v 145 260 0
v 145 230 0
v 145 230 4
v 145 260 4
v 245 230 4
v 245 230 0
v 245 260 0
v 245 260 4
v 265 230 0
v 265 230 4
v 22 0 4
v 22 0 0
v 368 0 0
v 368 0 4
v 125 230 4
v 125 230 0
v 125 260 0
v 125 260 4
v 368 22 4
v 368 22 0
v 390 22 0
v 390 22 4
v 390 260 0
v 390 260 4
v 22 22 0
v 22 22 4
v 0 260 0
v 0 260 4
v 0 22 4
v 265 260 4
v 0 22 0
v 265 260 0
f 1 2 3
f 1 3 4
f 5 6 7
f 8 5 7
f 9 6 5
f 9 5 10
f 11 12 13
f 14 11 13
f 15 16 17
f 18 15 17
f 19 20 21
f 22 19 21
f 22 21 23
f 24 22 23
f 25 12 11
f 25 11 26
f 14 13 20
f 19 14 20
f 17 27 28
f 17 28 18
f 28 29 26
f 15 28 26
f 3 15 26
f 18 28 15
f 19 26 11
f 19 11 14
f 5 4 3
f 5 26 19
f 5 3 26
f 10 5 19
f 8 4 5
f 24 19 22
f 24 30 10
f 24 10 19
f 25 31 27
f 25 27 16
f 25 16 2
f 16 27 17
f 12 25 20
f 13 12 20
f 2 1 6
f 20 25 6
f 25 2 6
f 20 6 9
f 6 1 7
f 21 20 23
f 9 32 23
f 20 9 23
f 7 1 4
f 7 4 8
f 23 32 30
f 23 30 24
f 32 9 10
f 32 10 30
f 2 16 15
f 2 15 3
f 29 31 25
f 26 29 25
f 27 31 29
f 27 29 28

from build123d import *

# Parameters (mm, degrees)
BOX004_W     = 20
BOX004_H     = 30
BOX004_DEPTH = 10
BOX003_W     = 20
BOX003_H     = 30
BOX003_DEPTH = 10
BOX002_W     = 22
BOX002_H     = 22
BOX002_DEPTH = 10
BOX001_W     = 22
BOX001_H     = 22
BOX001_DEPTH = 10
BOX_W        = 390
BOX_H        = 260
BOX_DEPTH    = 4


with BuildPart() as corte_rail_der:
    # Box004 → Box004 (new body)
    with BuildSketch(Plane(origin=(245, 230, -3), x_dir=(1, 0, 0), z_dir=(0, 0, 1))):
        with Locations((10, 15)):
            Rectangle(BOX004_W, BOX004_H)
    extrude(amount=BOX004_DEPTH)


with BuildPart() as corte_rail_izq:
    # Box003 → Box003 (new body)
    with BuildSketch(Plane(origin=(125, 230, -3), x_dir=(1, 0, 0), z_dir=(0, 0, 1))):
        with Locations((10, 15)):
            Rectangle(BOX003_W, BOX003_H)
    extrude(amount=BOX003_DEPTH)


with BuildPart() as corte_der:
    # Box002 → Box002 (new body)
    with BuildSketch(Plane(origin=(368, 0, -3), x_dir=(1, 0, 0), z_dir=(0, 0, 1))):
        with Locations((11, 11)):
            Rectangle(BOX002_W, BOX002_H)
    extrude(amount=BOX002_DEPTH)


with BuildPart() as corte_izq:
    # Box001 → Box001 (new body)
    with BuildSketch(Plane.XY.offset(-3)):
        with Locations((11, 11)):
            Rectangle(BOX001_W, BOX001_H)
    extrude(amount=BOX001_DEPTH)


with BuildPart() as soporte_cubeta:
    # Box → Box (new body)
    with BuildSketch(Plane.XY):
        with Locations((195, 130)):
            Rectangle(BOX_W, BOX_H)
    extrude(amount=BOX_DEPTH)

    # Cut: cut corte_izq
    add(corte_izq.part, mode=Mode.SUBTRACT)

    # Cut001: cut corte_der
    add(corte_der.part, mode=Mode.SUBTRACT)

    # Cut002: cut corte_rail_izq
    add(corte_rail_izq.part, mode=Mode.SUBTRACT)

    # Cut003: cut corte_rail_der
    add(corte_rail_der.part, mode=Mode.SUBTRACT)


solid = soporte_cubeta.part
